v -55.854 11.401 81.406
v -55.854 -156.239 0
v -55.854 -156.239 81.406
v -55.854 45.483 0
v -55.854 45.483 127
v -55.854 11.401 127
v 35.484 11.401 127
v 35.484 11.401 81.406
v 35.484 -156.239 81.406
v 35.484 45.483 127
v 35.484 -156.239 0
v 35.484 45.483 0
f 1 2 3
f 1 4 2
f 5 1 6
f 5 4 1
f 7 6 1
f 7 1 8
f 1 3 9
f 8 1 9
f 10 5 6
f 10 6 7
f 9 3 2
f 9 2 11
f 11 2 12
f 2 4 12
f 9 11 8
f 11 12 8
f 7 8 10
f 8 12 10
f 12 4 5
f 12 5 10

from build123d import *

# Parameters (mm, degrees)
F0_W     = 91.3384
F0_H     = 97.5812673569
F1_DEPTH = 127
F2_W     = 91.3384
F2_H     = 45.5940548778
F3_DEPTH = 63.5
F4_DEPTH = 25.4
F5_W     = 91.3384
F5_H     = 81.4059451222
F6_DEPTH = 78.74


with BuildPart() as f1:
    # F0 (on Top) → F1 (new body)
    with BuildSketch(Plane.XY):
        with Locations((-10.1847631006, -3.307942301)):
            Rectangle(F0_W, F0_H)
    extrude(amount=F1_DEPTH)

    # F2 (on face) → F3 (cut)
    with BuildSketch(Plane.XZ.offset(52.0985759795)):
        with Locations((-10.1847631006, 104.2029725611)):
            Rectangle(F2_W, F2_H)
    extrude(amount=-F3_DEPTH, mode=Mode.SUBTRACT)

    # F4 (add): a face of the model
    f4_faces = [f1.faces().sort_by_distance(p)[0] for p in [
        (-10.1847631006, -52.0985759795, 40.7029725611),
    ]]
    extrude(f4_faces, amount=F4_DEPTH)

    # F5 (on face) → F6 (join)
    with BuildSketch(Plane.XZ.offset(77.4985759795)):
        with Locations((-10.1847631006, 40.7029725611)):
            Rectangle(F5_W, F5_H)
    extrude(amount=F6_DEPTH)


solid = f1.part
